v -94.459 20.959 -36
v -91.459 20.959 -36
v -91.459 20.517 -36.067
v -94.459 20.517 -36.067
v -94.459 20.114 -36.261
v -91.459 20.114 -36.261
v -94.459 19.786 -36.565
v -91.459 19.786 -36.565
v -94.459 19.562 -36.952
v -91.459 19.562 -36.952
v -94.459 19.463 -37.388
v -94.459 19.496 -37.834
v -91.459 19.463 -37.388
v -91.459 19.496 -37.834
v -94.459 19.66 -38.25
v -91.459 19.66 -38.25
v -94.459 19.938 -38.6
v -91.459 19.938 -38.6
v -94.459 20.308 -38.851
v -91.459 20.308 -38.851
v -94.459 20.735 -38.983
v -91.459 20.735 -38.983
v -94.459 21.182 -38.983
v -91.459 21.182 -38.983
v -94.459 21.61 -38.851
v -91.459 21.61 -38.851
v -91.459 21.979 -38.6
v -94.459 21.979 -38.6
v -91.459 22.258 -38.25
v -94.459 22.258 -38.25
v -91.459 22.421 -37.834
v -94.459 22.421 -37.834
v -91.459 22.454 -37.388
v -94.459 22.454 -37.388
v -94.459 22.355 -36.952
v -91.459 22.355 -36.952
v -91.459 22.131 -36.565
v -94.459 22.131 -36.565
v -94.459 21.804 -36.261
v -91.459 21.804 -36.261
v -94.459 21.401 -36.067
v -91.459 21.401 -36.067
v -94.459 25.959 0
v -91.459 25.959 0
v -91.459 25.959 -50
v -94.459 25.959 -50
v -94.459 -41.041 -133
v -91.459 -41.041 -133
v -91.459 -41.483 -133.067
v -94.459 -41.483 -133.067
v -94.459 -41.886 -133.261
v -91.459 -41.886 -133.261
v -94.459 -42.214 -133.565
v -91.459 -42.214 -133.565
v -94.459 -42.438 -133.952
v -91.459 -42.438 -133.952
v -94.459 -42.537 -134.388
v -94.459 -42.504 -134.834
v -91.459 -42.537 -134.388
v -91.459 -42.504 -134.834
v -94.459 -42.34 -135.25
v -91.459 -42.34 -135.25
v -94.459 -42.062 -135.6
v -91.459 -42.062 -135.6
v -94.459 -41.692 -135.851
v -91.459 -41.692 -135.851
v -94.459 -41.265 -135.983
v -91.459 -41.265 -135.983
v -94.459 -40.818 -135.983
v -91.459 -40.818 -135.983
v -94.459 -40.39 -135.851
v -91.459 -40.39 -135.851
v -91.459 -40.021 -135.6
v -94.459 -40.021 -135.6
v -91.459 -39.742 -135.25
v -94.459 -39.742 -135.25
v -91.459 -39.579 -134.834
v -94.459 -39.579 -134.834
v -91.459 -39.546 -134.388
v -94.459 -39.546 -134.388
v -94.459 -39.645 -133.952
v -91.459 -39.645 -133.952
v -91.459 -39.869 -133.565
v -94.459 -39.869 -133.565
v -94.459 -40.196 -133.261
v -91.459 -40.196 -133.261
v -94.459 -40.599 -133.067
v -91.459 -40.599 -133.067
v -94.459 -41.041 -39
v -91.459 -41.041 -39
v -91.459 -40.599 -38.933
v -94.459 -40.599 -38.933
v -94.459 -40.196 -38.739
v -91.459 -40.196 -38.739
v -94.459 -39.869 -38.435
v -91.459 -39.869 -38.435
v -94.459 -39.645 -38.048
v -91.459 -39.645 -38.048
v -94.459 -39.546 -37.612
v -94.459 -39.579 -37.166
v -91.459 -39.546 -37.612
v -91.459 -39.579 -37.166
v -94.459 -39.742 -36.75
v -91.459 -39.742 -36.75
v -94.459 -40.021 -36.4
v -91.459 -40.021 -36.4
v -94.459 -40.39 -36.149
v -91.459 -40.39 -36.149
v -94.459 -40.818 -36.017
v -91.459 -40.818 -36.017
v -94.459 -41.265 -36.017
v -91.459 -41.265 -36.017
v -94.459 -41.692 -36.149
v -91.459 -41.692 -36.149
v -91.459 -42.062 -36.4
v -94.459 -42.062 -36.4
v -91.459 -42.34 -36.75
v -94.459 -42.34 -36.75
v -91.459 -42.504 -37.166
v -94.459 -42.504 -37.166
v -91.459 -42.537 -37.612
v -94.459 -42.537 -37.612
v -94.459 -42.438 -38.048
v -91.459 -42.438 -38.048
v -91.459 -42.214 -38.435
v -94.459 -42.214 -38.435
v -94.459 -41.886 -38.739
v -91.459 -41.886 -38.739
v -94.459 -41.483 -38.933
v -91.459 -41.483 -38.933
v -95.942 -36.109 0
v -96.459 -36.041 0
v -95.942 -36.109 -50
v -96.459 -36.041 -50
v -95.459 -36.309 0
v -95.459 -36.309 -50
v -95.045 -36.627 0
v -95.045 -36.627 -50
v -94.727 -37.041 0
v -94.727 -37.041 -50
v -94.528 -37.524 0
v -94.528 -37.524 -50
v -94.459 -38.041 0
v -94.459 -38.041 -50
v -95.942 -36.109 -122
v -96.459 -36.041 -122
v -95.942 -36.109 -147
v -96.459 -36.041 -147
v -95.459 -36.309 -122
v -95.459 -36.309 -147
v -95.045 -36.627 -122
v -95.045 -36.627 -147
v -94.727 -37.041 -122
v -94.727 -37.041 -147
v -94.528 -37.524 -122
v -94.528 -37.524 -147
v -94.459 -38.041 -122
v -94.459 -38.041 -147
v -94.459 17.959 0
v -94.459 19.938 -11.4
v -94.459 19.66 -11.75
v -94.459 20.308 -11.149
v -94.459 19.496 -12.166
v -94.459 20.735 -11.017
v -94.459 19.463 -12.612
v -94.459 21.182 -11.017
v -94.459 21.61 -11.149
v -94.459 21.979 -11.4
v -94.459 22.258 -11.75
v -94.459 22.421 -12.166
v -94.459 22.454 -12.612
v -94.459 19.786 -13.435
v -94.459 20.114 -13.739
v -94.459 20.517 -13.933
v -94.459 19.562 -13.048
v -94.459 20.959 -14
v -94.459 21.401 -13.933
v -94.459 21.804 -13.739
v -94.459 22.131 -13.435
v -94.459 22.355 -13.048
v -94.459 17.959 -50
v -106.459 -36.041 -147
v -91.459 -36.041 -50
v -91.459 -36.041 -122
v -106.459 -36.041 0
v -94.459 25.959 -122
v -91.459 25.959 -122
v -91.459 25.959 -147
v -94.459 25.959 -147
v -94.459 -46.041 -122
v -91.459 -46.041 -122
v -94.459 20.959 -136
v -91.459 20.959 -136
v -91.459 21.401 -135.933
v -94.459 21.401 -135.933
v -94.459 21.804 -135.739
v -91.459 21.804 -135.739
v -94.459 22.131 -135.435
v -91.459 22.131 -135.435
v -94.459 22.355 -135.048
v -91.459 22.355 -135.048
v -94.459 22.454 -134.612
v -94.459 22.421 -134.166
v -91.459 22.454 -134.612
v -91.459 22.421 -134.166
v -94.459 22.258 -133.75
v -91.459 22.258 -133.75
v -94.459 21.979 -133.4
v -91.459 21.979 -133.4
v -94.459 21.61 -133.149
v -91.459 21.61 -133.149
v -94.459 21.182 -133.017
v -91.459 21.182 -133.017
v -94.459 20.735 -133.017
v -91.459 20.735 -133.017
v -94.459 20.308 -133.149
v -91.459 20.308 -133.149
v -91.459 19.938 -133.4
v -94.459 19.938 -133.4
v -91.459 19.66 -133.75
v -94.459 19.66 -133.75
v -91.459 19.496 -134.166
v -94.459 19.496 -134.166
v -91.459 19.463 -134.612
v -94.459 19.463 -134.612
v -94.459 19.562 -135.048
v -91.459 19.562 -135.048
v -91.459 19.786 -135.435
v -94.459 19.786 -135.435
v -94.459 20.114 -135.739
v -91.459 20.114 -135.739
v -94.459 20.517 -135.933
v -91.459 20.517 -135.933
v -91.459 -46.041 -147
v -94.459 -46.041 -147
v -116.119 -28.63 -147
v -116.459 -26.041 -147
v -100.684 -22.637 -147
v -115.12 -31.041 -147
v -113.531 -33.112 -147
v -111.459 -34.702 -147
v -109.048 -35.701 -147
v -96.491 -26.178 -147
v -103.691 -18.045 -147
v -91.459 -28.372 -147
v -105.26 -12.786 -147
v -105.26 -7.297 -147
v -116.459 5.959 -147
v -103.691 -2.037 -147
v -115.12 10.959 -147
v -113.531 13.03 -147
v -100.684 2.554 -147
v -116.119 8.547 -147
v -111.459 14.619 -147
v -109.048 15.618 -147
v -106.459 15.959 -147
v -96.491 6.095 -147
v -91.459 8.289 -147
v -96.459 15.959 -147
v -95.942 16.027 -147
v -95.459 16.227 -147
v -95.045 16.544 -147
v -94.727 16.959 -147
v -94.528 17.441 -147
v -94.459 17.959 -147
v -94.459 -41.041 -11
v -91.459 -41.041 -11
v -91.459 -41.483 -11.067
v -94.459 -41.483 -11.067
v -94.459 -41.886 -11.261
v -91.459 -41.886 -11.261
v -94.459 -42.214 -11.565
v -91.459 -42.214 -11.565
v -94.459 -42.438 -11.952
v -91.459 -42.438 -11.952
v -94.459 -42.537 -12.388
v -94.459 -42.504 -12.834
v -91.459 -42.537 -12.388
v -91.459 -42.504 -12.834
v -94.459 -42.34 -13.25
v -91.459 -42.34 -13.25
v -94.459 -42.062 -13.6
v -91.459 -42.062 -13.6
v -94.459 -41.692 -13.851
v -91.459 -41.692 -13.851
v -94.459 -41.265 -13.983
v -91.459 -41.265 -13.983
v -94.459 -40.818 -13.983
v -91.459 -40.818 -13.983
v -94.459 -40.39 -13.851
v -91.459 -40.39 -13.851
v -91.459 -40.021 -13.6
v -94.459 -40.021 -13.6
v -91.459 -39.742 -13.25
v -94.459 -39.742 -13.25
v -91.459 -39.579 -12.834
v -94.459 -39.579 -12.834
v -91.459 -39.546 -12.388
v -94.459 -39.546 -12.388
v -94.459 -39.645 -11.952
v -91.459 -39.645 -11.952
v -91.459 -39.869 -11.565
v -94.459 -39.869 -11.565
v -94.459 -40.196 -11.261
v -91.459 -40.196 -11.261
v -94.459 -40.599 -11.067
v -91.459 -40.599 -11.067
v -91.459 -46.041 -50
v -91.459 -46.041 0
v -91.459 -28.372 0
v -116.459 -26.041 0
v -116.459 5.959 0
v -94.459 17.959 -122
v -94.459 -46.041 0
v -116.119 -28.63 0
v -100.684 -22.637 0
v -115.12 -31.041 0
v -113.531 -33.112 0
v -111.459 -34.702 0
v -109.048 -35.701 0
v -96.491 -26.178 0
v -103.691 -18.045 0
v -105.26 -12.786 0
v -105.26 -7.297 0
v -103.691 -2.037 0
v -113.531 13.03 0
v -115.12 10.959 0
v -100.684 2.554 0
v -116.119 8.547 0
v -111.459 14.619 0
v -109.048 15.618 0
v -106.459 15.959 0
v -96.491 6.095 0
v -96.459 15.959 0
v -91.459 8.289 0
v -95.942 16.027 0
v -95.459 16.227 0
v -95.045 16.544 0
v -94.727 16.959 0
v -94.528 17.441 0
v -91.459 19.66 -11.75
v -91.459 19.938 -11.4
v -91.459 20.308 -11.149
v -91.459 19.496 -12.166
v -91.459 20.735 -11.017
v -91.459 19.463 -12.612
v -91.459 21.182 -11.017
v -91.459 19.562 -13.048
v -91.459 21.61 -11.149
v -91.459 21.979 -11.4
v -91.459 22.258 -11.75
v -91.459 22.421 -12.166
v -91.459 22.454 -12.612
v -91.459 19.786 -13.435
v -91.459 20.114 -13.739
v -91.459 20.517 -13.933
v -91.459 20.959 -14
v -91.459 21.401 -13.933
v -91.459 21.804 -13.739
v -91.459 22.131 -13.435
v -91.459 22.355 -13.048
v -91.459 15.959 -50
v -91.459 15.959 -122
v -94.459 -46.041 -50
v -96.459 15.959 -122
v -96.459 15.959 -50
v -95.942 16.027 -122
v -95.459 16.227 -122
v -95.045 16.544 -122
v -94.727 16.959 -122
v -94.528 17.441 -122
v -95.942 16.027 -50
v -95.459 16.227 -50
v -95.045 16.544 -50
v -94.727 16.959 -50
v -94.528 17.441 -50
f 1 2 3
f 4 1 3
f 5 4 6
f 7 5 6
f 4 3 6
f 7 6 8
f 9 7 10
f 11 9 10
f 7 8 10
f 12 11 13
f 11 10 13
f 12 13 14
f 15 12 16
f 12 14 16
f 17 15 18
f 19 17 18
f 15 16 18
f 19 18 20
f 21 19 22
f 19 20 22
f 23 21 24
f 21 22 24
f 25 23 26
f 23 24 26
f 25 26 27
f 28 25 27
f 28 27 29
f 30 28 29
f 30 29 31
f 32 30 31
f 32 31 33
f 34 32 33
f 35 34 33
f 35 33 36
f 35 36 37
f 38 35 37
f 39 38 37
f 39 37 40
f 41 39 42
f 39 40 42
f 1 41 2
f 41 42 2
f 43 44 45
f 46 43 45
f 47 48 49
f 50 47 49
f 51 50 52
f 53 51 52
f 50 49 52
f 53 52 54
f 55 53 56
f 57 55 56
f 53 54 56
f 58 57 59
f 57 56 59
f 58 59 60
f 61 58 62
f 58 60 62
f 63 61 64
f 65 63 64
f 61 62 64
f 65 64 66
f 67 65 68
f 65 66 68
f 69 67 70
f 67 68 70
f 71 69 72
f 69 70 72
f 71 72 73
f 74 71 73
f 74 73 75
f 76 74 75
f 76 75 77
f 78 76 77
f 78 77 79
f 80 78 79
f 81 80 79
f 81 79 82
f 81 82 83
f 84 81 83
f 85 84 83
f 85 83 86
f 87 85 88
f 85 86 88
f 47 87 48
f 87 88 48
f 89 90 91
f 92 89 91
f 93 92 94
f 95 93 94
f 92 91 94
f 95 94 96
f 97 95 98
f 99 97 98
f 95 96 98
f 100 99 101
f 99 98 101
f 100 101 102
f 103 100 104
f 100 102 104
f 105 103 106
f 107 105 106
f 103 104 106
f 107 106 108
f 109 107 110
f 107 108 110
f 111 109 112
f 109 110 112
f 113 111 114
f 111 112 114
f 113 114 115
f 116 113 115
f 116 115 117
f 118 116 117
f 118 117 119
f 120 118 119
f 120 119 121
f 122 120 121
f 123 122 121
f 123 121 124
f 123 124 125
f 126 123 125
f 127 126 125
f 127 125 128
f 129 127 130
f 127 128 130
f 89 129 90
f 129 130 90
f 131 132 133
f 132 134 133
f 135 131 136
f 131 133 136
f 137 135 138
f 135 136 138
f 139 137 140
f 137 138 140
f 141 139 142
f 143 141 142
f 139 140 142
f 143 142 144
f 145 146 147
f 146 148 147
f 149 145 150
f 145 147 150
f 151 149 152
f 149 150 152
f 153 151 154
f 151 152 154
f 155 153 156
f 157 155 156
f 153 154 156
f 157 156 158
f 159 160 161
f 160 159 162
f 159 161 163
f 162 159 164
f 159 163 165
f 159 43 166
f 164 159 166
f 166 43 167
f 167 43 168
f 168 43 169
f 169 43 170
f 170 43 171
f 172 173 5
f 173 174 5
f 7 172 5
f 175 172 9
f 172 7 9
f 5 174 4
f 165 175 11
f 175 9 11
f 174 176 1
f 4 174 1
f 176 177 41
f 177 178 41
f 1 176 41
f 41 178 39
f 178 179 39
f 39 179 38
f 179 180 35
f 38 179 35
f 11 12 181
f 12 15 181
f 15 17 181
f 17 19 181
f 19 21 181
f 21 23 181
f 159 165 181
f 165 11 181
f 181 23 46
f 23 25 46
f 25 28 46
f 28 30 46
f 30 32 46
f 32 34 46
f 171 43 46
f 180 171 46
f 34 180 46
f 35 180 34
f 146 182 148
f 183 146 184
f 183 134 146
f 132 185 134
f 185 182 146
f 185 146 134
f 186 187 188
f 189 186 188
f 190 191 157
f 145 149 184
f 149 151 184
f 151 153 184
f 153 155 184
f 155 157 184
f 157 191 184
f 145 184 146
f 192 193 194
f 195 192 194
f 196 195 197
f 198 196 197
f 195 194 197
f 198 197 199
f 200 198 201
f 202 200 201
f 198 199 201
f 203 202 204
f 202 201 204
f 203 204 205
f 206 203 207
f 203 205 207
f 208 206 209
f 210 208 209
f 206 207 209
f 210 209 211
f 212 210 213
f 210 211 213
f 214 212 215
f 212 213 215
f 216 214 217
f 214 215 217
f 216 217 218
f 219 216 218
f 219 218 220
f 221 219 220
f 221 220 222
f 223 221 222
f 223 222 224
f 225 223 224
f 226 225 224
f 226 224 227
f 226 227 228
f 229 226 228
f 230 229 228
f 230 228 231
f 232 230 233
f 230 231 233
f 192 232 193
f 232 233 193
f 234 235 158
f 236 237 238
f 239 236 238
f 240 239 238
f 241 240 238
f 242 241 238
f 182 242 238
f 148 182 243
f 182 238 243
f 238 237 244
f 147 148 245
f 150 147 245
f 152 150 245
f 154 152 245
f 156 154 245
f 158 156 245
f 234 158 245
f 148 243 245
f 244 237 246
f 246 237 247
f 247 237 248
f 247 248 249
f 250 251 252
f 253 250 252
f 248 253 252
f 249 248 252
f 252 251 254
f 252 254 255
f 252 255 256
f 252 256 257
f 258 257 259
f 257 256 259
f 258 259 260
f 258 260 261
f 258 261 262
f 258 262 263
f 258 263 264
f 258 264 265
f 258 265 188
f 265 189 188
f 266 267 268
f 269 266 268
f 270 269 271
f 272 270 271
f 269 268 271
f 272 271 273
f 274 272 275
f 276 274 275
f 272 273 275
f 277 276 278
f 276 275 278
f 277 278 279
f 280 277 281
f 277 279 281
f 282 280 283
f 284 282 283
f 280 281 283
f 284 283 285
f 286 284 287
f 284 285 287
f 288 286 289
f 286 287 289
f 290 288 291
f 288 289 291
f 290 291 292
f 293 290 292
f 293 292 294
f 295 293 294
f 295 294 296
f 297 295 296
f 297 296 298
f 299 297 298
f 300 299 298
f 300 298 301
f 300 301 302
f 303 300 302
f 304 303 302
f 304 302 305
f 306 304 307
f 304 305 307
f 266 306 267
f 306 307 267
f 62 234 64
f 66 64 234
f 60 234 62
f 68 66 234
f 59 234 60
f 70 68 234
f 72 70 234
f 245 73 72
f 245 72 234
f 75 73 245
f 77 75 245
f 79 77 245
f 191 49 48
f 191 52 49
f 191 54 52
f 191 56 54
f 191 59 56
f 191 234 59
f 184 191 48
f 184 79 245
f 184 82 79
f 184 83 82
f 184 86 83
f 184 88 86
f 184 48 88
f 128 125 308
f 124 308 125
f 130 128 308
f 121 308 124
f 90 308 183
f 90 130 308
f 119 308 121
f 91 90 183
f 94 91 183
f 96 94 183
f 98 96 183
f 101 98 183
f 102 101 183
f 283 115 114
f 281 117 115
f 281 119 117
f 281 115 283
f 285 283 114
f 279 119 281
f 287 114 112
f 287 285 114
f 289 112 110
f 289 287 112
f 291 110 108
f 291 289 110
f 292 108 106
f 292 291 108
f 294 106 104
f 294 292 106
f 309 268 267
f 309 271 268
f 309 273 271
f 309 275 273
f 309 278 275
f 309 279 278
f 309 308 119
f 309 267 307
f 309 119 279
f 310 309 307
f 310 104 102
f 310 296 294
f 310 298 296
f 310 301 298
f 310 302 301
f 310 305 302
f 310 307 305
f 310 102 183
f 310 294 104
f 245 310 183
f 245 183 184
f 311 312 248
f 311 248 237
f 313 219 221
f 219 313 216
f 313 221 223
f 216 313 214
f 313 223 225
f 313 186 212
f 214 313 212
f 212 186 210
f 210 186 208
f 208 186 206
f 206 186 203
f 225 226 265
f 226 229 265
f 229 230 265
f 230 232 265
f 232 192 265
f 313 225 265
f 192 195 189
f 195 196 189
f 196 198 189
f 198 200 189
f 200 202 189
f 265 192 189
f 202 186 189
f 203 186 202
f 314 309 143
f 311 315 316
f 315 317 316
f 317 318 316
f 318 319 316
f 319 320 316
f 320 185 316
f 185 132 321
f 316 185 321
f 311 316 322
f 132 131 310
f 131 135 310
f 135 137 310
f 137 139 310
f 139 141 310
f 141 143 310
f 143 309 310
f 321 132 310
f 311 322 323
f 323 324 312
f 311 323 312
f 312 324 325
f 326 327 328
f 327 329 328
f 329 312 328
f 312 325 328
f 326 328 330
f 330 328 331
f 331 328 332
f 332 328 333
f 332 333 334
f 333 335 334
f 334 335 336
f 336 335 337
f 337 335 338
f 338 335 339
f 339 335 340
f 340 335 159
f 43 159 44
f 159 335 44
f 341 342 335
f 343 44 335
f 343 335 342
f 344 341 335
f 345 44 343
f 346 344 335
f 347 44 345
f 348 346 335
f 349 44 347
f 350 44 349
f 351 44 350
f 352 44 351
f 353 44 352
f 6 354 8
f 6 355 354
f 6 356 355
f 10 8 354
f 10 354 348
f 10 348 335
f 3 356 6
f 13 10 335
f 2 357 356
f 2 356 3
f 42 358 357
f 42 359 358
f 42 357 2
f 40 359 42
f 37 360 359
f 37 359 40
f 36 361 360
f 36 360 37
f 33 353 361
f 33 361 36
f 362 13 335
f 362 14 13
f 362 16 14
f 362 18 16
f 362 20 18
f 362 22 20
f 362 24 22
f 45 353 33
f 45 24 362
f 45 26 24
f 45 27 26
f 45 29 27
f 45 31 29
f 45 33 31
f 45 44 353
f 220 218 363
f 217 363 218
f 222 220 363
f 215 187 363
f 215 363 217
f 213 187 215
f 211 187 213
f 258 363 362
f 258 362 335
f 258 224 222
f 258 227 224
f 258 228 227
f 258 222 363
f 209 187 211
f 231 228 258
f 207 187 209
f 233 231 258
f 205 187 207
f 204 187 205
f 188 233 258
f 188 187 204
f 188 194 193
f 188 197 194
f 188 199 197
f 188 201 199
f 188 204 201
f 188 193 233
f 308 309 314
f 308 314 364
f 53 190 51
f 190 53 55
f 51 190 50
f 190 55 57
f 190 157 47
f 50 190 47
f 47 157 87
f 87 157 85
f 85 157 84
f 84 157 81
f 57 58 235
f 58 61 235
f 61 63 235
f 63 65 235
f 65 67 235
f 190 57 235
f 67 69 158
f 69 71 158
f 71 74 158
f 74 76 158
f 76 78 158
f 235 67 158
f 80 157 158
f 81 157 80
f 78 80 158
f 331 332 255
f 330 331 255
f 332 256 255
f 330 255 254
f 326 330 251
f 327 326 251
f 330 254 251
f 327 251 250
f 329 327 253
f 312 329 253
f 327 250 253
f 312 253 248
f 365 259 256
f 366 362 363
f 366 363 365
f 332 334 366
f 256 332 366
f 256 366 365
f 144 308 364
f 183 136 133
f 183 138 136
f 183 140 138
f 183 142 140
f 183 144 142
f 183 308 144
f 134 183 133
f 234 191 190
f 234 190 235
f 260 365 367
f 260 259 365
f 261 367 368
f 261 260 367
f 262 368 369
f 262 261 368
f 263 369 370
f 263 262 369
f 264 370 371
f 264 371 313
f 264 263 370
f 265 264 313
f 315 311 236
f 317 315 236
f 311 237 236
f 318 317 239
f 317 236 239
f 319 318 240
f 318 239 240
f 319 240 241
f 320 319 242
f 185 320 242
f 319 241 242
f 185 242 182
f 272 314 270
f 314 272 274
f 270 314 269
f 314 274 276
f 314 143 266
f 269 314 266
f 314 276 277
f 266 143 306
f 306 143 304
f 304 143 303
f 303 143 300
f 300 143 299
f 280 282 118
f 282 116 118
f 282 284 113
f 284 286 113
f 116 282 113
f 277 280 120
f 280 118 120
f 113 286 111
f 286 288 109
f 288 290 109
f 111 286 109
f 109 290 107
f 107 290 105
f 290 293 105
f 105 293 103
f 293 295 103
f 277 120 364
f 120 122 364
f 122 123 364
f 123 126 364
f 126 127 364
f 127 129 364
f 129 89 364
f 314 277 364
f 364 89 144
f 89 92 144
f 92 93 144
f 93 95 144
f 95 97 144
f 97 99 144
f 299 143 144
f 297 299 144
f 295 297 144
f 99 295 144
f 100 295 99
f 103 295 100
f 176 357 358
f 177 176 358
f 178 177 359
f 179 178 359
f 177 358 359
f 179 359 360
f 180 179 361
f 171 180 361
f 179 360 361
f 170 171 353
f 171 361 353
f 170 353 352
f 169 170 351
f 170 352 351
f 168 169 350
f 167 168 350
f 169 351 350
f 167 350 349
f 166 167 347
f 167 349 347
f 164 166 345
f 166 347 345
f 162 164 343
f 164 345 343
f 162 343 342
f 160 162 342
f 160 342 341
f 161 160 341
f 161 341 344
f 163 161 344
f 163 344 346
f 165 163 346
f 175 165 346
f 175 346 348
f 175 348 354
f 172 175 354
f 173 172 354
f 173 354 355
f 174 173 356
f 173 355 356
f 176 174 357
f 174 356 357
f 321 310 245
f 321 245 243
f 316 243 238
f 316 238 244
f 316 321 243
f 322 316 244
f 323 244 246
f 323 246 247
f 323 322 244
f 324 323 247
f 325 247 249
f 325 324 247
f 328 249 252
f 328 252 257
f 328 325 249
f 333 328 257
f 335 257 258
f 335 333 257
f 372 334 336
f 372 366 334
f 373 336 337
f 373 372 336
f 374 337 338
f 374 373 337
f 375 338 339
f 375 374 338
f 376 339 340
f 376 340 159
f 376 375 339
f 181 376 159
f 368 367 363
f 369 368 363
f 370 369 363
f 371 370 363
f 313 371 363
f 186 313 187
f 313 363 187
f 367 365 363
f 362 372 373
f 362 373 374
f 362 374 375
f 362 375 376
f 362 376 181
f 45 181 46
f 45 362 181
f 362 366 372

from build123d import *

# Parameters (mm, degrees)
BOSS_EXTRUDE1_DEPTH = 147
SKETCH2_W           = 50
SKETCH2_H           = 10
SKETCH2_R           = 1.5
SKETCH2_W_2         = 25
BOSS_EXTRUDE2_DEPTH = 3
FILLET1_R           = 10
FILLET2_R           = 2


with BuildPart() as part:
    # Sketch1 → Boss-Extrude1 (new body)
    with BuildSketch(Plane.XY):
        with BuildLine():
            Line((-91.459491941, 15.958690151), (-116.459491941, 15.958690151))
            Line((-116.459491941, 15.958690151), (-116.459491941, -36.041309849))
            Line((-116.459491941, -36.041309849), (-91.459491941, -36.041309849))
            Line((-91.459491941, -36.041309849), (-91.459491941, -28.371612629))
            ThreePointArc((-91.459491941, -28.371612629), (-105.459491941, -10.041309849), (-91.459491941, 8.288992931))
            Line((-91.459491941, 8.288992931), (-91.459491941, 15.958690151))
        make_face()
    extrude(amount=-BOSS_EXTRUDE1_DEPTH)

    # Sketch2 → Boss-Extrude2 (add)
    # profile 1 of 4: a face of its own
    with BuildSketch(Plane(origin=(-91.459491941, 0, 0), x_dir=(0, 0, -1), z_dir=(1, 0, 0))):
        with Locations((25, 20.958690151)):
            Rectangle(SKETCH2_W, SKETCH2_H)
        with Locations((12.5, 20.958690151)):
            Circle(SKETCH2_R, mode=Mode.SUBTRACT)
        with Locations(Location((37.5, 20.958690151, 0), (0, 0, 180))):
            Circle(SKETCH2_R, mode=Mode.SUBTRACT)
    # profile 2 of 4: a face of its own
    with BuildSketch(Plane(origin=(-91.459491941, 0, 0), x_dir=(0, 0, -1), z_dir=(1, 0, 0))):
        with Locations((134.5, 20.958690151)):
            Rectangle(SKETCH2_W_2, SKETCH2_H)
        with Locations((134.5, 20.958690151)):
            Circle(SKETCH2_R, mode=Mode.SUBTRACT)
    # profile 3 of 4: a face of its own
    with BuildSketch(Plane(origin=(-91.459491941, 0, 0), x_dir=(0, 0, -1), z_dir=(1, 0, 0))):
        with Locations((25, -41.041309849)):
            Rectangle(SKETCH2_W, SKETCH2_H)
        with Locations((37.5, -41.041309849)):
            Circle(SKETCH2_R, mode=Mode.SUBTRACT)
        with Locations(Location((12.5, -41.041309849, 0), (0, 0, 180))):
            Circle(SKETCH2_R, mode=Mode.SUBTRACT)
    # profile 4 of 4: a face of its own
    with BuildSketch(Plane(origin=(-91.459491941, 0, 0), x_dir=(0, 0, -1), z_dir=(1, 0, 0))):
        with Locations((134.5, -41.041309849)):
            Rectangle(SKETCH2_W_2, SKETCH2_H)
        with Locations(Location((134.5, -41.041309849, 0), (0, 0, 180))):
            Circle(SKETCH2_R, mode=Mode.SUBTRACT)
    extrude(amount=-BOSS_EXTRUDE2_DEPTH)

    # Fillet1
    fillet1_edges = [part.edges().sort_by_distance(p)[0] for p in [
        (-116.459491941, 15.958690151, -73.5),
        (-116.459491941, -36.041309849, -73.5),
    ]]
    fillet(fillet1_edges, radius=FILLET1_R)

    # Fillet2
    fillet2_edges = [part.edges().sort_by_distance(p)[0] for p in [
        (-94.459491941, 15.958690151, -25),
        (-94.459491941, 15.958690151, -134.5),
        (-94.459491941, -36.041309849, -25),
        (-94.459491941, -36.041309849, -134.5),
    ]]
    fillet(fillet2_edges, radius=FILLET2_R)


solid = part.part
